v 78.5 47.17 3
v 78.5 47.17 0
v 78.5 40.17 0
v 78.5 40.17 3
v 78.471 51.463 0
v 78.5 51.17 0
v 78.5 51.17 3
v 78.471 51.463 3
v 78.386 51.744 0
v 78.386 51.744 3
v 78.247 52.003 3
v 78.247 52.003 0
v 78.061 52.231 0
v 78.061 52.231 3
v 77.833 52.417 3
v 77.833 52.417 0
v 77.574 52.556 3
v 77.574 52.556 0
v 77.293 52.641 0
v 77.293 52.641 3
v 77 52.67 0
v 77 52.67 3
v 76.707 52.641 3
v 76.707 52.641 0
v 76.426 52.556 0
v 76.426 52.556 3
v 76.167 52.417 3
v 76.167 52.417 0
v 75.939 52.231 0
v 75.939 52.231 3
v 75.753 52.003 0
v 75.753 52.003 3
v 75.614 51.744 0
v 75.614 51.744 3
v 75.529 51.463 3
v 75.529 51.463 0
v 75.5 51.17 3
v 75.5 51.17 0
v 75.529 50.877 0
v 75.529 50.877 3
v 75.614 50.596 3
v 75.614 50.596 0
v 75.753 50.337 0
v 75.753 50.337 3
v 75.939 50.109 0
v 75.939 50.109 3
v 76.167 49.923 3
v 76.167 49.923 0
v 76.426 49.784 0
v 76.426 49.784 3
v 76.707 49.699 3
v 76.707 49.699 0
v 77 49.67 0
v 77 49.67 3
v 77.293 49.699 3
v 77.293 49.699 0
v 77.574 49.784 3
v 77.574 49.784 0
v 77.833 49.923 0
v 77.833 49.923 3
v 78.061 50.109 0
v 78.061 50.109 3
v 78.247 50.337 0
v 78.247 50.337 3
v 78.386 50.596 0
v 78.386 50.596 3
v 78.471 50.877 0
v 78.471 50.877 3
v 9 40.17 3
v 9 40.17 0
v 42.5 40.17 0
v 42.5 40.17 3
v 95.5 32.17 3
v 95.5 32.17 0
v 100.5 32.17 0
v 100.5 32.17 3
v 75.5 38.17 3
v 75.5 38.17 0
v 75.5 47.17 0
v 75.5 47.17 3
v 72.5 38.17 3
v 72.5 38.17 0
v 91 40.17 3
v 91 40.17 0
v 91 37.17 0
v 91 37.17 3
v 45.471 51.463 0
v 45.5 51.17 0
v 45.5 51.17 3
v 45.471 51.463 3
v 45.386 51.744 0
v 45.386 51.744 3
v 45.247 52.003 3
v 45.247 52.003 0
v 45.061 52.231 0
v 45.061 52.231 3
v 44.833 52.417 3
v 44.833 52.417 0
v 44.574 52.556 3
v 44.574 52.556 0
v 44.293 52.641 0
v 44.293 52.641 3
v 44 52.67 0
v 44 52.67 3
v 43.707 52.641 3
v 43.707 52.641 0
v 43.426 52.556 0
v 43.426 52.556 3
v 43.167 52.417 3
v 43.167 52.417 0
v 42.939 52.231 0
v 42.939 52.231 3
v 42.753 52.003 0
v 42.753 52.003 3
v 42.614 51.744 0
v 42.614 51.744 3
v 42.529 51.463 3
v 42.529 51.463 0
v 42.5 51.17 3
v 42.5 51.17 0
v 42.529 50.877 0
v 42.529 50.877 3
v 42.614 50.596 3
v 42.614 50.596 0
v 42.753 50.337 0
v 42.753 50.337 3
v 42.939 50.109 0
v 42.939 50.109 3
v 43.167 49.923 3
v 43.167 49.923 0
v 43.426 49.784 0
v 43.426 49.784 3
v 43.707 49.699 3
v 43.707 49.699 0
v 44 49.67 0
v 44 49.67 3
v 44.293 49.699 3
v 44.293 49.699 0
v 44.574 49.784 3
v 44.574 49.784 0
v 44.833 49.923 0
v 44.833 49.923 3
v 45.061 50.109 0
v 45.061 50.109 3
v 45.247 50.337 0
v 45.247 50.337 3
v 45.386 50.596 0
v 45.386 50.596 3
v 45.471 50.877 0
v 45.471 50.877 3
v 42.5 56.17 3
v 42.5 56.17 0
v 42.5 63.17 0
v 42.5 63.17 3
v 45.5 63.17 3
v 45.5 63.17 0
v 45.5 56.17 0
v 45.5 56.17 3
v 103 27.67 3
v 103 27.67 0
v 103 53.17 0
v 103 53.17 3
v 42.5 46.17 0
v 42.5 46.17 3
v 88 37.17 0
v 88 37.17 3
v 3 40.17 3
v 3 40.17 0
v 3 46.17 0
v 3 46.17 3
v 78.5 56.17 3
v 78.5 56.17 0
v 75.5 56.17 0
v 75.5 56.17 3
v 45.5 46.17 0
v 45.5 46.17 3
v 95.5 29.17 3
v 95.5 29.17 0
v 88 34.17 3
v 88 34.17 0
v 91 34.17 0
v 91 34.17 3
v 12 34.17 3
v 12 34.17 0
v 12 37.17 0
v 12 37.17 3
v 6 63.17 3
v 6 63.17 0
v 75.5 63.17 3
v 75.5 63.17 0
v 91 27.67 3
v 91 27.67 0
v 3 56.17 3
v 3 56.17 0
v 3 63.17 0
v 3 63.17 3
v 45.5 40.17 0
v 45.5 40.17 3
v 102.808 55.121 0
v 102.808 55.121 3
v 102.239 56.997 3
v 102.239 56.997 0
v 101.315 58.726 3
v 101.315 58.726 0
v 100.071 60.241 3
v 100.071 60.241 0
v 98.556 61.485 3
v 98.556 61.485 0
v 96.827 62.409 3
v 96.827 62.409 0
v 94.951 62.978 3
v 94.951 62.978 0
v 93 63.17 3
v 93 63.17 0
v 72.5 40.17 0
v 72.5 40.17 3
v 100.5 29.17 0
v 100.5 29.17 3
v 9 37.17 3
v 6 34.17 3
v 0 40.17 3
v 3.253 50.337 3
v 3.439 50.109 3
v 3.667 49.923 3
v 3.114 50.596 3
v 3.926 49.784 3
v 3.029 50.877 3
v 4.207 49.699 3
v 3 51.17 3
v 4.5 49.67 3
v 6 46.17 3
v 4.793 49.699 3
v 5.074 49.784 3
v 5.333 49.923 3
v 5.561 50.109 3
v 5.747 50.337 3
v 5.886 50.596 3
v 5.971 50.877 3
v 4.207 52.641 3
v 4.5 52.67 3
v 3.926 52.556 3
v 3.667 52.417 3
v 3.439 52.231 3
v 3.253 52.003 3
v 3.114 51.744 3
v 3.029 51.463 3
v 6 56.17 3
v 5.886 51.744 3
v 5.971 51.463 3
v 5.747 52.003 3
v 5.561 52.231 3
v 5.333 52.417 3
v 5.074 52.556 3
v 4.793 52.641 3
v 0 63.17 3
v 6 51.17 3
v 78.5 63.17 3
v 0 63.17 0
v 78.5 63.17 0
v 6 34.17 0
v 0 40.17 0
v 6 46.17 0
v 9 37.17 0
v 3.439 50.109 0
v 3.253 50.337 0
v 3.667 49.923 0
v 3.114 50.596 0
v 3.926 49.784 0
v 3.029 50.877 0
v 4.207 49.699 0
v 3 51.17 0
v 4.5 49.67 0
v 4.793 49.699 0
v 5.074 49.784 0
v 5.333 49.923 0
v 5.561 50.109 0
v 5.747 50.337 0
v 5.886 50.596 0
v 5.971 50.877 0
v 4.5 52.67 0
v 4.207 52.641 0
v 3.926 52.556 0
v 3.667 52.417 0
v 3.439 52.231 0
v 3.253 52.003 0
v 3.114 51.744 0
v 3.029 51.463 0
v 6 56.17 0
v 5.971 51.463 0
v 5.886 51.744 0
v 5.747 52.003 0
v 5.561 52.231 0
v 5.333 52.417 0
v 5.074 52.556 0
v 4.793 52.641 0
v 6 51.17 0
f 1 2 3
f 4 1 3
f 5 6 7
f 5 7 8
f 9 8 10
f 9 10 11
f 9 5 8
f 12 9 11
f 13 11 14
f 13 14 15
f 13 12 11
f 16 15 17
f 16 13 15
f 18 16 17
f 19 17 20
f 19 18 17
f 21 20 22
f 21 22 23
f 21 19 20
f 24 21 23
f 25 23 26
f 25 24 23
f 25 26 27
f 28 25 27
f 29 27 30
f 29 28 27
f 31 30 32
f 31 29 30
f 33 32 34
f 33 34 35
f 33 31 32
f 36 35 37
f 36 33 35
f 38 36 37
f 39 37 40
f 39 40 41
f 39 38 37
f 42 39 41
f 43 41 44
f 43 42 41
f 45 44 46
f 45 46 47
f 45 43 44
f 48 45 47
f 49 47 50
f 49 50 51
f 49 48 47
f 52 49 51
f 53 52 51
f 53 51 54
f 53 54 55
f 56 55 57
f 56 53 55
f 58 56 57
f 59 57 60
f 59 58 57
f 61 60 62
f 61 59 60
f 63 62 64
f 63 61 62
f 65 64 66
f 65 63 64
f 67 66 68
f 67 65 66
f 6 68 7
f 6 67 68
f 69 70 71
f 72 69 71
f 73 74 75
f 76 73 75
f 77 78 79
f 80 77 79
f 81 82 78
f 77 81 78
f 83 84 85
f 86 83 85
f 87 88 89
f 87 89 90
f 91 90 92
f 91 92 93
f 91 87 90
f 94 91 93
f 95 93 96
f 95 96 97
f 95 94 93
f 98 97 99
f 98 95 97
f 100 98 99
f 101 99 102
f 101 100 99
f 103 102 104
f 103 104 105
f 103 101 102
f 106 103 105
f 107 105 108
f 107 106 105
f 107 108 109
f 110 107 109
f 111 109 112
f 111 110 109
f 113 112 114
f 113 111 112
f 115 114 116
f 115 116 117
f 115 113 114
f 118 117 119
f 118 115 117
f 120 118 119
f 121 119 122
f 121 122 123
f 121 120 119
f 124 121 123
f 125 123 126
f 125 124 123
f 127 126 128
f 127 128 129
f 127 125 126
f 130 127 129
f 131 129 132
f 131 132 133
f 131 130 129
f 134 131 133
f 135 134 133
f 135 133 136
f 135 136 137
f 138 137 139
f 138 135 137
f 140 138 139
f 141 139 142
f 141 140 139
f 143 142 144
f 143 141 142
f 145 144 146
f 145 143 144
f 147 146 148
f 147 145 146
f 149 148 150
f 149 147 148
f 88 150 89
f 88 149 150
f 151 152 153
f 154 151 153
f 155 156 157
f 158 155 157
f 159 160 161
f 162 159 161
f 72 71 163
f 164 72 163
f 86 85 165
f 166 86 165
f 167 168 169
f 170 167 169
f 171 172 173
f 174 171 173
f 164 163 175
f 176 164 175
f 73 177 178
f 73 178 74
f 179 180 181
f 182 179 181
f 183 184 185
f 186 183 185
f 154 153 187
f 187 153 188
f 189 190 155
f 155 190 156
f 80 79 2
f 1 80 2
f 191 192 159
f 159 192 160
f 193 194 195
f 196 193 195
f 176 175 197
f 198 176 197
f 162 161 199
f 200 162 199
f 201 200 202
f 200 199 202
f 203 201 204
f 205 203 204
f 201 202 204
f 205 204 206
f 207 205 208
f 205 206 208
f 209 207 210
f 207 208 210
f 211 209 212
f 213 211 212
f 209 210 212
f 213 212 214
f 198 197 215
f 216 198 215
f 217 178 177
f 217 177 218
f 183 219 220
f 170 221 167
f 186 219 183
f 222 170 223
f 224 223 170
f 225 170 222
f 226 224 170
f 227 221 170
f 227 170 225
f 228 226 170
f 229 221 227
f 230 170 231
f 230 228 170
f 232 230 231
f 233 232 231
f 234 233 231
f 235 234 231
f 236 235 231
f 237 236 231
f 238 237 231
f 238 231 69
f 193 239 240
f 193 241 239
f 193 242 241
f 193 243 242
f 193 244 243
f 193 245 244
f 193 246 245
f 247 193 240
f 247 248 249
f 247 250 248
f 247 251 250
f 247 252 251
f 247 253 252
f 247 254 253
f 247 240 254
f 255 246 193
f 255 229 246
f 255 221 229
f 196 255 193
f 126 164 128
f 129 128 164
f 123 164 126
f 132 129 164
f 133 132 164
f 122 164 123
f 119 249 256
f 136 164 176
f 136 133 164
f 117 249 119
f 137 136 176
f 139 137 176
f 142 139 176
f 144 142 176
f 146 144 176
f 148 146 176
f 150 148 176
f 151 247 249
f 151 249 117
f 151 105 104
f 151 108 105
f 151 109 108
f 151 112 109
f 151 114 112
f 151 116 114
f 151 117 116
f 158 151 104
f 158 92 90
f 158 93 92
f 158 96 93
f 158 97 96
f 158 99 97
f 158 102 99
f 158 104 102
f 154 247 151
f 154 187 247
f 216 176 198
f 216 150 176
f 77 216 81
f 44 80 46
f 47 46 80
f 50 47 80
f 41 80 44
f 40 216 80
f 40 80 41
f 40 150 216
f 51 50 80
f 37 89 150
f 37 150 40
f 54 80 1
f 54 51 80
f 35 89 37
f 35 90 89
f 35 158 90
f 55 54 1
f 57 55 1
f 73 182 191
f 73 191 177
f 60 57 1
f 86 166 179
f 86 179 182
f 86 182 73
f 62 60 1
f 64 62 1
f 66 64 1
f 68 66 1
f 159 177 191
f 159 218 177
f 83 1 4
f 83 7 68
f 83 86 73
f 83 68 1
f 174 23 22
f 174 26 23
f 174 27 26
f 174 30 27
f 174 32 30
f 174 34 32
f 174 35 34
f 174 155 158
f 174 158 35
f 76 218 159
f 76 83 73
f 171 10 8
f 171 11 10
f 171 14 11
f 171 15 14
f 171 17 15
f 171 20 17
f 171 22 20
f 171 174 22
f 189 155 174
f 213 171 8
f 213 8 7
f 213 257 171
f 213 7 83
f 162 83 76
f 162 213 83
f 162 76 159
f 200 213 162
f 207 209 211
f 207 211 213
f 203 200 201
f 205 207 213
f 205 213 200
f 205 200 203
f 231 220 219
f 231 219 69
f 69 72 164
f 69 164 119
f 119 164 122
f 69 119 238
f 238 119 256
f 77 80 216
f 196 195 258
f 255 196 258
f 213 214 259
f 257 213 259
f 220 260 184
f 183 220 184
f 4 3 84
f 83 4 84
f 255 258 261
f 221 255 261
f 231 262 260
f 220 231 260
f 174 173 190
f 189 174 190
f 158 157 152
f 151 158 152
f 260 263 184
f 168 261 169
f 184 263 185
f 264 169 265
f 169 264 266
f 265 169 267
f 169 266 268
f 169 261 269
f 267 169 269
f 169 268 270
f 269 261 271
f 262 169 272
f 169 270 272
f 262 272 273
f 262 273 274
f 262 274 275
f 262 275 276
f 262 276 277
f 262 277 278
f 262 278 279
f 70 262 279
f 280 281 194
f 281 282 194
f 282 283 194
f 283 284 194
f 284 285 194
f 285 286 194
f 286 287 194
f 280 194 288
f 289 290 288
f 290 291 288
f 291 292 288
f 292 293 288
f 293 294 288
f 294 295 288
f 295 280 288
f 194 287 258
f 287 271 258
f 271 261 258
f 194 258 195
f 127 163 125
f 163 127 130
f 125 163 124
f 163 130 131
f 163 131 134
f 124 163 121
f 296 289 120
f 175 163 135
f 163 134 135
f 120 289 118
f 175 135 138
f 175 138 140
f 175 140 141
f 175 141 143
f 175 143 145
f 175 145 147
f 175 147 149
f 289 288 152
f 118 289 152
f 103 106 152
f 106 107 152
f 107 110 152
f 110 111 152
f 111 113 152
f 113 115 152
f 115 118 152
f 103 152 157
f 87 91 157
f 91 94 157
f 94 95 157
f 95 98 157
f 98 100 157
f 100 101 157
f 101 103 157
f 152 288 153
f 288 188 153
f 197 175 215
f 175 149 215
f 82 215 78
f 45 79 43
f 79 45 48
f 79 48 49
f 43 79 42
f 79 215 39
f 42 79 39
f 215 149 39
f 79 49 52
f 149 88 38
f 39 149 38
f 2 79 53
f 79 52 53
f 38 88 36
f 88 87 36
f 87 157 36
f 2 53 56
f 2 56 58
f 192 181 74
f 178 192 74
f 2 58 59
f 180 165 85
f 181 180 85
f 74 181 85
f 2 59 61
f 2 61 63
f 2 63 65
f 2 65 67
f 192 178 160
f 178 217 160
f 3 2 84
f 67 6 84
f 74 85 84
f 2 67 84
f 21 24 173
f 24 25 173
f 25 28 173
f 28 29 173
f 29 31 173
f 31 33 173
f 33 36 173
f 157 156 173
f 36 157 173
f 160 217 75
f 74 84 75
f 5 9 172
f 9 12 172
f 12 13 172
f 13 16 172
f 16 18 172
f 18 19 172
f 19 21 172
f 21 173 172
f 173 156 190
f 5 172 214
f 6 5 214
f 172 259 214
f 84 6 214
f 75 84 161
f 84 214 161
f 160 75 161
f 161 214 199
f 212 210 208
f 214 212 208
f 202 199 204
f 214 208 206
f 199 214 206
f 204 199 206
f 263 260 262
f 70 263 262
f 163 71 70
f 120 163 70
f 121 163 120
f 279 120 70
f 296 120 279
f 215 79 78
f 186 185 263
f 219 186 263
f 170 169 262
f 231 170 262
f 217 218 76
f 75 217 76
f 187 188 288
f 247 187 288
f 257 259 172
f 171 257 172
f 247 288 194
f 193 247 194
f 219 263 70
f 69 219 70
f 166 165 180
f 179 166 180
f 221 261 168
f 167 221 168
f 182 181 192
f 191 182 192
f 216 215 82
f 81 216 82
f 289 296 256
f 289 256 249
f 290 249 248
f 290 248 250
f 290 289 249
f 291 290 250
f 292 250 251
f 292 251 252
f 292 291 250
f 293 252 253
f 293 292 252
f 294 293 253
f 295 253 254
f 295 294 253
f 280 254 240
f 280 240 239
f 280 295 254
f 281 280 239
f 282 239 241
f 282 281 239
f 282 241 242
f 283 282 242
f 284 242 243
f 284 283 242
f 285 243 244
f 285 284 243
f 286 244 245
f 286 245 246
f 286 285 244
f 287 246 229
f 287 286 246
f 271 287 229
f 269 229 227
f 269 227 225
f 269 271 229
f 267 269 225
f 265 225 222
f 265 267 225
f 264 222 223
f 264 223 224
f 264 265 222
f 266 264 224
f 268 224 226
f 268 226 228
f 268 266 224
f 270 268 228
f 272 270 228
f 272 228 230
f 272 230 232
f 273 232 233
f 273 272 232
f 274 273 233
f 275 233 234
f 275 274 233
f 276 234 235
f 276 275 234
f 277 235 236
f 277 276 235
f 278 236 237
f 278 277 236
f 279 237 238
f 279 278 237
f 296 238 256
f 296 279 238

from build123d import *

# Parameters (mm, degrees)
SKETCH_1_R      = 1.5
SKETCH_1_W      = 5
SKETCH_1_H      = 3
EXTRUDE_1_DEPTH = 3


with BuildPart() as part:
    # 草图1 → 凸台-拉伸1 (new body)
    with BuildSketch(Plane.XY):
        with BuildLine():
            Line((0, 63.169976396), (0, 40.169976396))
            Line((0, 40.169976396), (3, 40.169976396))
            Line((3, 40.169976396), (3, 46.169976396))
            Line((3, 46.169976396), (6, 46.169976396))
            Line((6, 46.169976396), (6, 34.169976396))
            Line((6, 34.169976396), (12, 34.169976396))
            Line((12, 34.169976396), (12, 37.169976396))
            Line((12, 37.169976396), (9, 37.169976396))
            Line((9, 37.169976396), (9, 40.169976396))
            Line((9, 40.169976396), (42.5, 40.169976396))
            Line((42.5, 40.169976396), (42.5, 46.169976396))
            Line((42.5, 46.169976396), (45.5, 46.169976396))
            Line((45.5, 46.169976396), (45.5, 40.169976396))
            Line((45.5, 40.169976396), (72.5, 40.169976396))
            Line((72.5, 40.169976396), (72.5, 38.169976396))
            Line((72.5, 38.169976396), (75.5, 38.169976396))
            Line((75.5, 38.169976396), (75.5, 47.169976396))
            Line((75.5, 47.169976396), (78.5, 47.169976396))
            Line((78.5, 47.169976396), (78.5, 40.169976396))
            Line((78.5, 40.169976396), (91, 40.169976396))
            Line((91, 40.169976396), (91, 37.169976396))
            Line((91, 37.169976396), (88, 37.169976396))
            Line((88, 37.169976396), (88, 34.169976396))
            Line((88, 34.169976396), (91, 34.169976396))
            Line((91, 34.169976396), (91, 27.669976396))
            Line((91, 27.669976396), (103, 27.669976396))
            Line((103, 27.669976396), (103, 53.169976396))
            ThreePointArc((103, 53.169976396), (100.071067812, 60.241044208), (93, 63.169976396))
            Line((93, 63.169976396), (78.5, 63.169976396))
            Line((78.5, 63.169976396), (78.5, 56.169976396))
            Line((78.5, 56.169976396), (75.5, 56.169976396))
            Line((75.5, 56.169976396), (75.5, 63.169976396))
            Line((75.5, 63.169976396), (45.5, 63.169976396))
            Line((45.5, 63.169976396), (45.5, 56.169976396))
            Line((45.5, 56.169976396), (42.5, 56.169976396))
            Line((42.5, 56.169976396), (42.5, 63.169976396))
            Line((42.5, 63.169976396), (6, 63.169976396))
            Line((6, 63.169976396), (6, 56.169976396))
            Line((6, 56.169976396), (3, 56.169976396))
            Line((3, 56.169976396), (3, 63.169976396))
            Line((3, 63.169976396), (0, 63.169976396))
        make_face()
        with Locations((4.5, 51.169976396)):
            Circle(SKETCH_1_R, mode=Mode.SUBTRACT)
        with Locations((44, 51.169976396)):
            Circle(SKETCH_1_R, mode=Mode.SUBTRACT)
        with Locations((77, 51.169976396)):
            Circle(SKETCH_1_R, mode=Mode.SUBTRACT)
        with Locations((98, 30.669976396)):
            Rectangle(SKETCH_1_W, SKETCH_1_H, mode=Mode.SUBTRACT)
    extrude(amount=EXTRUDE_1_DEPTH)


solid = part.part
